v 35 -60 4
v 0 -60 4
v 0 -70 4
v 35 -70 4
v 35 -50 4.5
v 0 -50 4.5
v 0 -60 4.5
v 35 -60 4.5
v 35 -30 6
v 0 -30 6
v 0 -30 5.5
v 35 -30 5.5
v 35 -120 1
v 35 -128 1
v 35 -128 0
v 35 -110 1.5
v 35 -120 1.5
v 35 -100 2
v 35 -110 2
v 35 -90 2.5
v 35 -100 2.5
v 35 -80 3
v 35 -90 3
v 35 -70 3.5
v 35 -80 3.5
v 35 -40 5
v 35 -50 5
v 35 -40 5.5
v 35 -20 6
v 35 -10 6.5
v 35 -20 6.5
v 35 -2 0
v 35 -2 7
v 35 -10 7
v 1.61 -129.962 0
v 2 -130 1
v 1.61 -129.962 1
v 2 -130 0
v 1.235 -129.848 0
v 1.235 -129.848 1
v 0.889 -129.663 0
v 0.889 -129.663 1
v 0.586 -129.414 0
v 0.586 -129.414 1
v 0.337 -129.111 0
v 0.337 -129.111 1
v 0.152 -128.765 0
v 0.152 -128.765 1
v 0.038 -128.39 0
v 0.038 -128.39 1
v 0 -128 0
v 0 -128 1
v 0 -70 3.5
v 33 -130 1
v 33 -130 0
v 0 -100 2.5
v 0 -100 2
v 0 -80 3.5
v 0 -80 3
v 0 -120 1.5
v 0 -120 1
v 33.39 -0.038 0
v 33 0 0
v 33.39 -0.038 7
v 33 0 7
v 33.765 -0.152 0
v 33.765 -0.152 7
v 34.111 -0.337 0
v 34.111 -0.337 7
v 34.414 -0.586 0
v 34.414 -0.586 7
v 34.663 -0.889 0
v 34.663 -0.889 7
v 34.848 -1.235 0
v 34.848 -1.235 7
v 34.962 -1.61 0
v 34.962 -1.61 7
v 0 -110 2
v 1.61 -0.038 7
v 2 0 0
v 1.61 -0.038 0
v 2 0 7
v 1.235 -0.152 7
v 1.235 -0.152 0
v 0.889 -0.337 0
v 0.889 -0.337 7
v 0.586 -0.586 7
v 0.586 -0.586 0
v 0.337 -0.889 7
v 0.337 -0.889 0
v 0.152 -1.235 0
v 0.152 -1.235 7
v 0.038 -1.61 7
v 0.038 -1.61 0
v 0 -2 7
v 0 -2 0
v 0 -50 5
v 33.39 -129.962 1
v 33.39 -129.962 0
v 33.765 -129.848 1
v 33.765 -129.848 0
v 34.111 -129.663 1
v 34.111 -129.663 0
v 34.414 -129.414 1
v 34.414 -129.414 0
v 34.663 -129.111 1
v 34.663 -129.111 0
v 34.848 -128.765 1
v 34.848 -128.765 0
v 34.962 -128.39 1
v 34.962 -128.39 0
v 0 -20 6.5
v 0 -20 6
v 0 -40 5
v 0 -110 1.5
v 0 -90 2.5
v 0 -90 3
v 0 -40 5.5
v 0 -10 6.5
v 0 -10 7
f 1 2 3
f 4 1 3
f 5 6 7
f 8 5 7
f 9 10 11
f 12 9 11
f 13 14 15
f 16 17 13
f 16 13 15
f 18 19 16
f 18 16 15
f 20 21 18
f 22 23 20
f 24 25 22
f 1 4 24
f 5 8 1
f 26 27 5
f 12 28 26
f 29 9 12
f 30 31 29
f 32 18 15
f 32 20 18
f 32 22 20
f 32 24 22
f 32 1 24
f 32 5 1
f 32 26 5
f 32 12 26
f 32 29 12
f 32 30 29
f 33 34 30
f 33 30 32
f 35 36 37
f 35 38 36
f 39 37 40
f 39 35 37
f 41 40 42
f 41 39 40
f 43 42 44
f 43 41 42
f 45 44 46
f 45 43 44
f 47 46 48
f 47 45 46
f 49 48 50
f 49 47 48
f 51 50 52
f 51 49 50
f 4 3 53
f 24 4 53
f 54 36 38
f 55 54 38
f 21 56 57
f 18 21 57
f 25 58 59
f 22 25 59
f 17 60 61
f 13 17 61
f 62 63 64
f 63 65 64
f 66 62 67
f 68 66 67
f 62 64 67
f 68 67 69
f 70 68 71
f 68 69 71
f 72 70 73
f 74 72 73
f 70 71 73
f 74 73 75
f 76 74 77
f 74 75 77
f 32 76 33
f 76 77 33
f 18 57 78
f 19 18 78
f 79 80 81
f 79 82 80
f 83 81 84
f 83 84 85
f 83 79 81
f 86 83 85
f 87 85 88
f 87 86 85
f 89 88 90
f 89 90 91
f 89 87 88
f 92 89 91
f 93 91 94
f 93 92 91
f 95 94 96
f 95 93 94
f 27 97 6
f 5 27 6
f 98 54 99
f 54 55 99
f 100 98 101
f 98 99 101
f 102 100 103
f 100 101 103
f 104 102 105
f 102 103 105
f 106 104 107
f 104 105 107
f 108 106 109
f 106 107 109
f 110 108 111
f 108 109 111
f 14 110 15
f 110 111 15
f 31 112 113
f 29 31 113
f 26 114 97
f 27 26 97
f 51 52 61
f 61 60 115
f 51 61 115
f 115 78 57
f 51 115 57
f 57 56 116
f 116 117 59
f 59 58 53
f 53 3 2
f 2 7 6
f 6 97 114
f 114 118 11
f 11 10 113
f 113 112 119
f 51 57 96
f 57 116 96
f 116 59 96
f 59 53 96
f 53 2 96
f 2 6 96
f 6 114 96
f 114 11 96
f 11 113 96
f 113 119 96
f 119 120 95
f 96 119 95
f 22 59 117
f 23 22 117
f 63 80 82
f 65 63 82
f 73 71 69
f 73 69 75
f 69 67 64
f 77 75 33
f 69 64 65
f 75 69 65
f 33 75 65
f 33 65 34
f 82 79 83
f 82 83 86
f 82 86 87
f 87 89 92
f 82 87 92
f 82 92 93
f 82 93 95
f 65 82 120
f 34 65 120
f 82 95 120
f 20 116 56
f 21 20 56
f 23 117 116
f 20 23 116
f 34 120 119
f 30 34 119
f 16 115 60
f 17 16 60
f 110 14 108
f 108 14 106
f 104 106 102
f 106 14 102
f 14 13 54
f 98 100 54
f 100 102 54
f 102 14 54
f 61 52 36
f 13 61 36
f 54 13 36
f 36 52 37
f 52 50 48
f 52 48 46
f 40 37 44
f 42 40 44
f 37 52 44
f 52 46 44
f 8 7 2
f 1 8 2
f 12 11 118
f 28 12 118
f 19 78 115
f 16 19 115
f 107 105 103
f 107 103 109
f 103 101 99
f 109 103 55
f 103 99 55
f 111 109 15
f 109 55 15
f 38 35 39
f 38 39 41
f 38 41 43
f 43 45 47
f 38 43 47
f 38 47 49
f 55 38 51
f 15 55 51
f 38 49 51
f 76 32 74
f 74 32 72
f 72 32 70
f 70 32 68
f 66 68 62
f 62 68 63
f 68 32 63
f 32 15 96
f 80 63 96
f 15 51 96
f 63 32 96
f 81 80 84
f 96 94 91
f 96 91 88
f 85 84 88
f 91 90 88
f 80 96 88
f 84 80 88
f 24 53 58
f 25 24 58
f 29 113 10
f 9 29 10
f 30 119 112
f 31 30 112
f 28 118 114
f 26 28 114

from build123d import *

# Parameters (mm, degrees)
F1_DEPTH = 35
F2_R     = 2


with BuildPart() as f1:
    # F0 (on Right) → F1 (new body)
    with BuildSketch(Plane.YZ):
        Polygon((-60, 4.5), (-60, 4), (-70, 4), (-70, 3.5), (-80, 3.5), (-80, 3), (-90, 3), (-90, 2.5), (-100, 2.5), (-100, 2), (-110, 2), (-110, 1.5), (-120, 1.5), (-120, 1), (-130, 1), (-130, 0), (0, 0), (0, 7), (-10, 7), (-10, 6.5), (-20, 6.5), (-20, 6), (-30, 6), (-30, 5.5), (-40, 5.5), (-40, 5), (-50, 5), (-50, 4.5), align=None)
    extrude(amount=F1_DEPTH)

    # F2
    f2_edges = [f1.edges().sort_by_distance(p)[0] for p in [
        (35, 0, 3.5),
        (35, -130, 0.5),
        (0, -130, 0.5),
        (0, 0, 3.5),
    ]]
    fillet(f2_edges, radius=F2_R)


solid = f1.part
